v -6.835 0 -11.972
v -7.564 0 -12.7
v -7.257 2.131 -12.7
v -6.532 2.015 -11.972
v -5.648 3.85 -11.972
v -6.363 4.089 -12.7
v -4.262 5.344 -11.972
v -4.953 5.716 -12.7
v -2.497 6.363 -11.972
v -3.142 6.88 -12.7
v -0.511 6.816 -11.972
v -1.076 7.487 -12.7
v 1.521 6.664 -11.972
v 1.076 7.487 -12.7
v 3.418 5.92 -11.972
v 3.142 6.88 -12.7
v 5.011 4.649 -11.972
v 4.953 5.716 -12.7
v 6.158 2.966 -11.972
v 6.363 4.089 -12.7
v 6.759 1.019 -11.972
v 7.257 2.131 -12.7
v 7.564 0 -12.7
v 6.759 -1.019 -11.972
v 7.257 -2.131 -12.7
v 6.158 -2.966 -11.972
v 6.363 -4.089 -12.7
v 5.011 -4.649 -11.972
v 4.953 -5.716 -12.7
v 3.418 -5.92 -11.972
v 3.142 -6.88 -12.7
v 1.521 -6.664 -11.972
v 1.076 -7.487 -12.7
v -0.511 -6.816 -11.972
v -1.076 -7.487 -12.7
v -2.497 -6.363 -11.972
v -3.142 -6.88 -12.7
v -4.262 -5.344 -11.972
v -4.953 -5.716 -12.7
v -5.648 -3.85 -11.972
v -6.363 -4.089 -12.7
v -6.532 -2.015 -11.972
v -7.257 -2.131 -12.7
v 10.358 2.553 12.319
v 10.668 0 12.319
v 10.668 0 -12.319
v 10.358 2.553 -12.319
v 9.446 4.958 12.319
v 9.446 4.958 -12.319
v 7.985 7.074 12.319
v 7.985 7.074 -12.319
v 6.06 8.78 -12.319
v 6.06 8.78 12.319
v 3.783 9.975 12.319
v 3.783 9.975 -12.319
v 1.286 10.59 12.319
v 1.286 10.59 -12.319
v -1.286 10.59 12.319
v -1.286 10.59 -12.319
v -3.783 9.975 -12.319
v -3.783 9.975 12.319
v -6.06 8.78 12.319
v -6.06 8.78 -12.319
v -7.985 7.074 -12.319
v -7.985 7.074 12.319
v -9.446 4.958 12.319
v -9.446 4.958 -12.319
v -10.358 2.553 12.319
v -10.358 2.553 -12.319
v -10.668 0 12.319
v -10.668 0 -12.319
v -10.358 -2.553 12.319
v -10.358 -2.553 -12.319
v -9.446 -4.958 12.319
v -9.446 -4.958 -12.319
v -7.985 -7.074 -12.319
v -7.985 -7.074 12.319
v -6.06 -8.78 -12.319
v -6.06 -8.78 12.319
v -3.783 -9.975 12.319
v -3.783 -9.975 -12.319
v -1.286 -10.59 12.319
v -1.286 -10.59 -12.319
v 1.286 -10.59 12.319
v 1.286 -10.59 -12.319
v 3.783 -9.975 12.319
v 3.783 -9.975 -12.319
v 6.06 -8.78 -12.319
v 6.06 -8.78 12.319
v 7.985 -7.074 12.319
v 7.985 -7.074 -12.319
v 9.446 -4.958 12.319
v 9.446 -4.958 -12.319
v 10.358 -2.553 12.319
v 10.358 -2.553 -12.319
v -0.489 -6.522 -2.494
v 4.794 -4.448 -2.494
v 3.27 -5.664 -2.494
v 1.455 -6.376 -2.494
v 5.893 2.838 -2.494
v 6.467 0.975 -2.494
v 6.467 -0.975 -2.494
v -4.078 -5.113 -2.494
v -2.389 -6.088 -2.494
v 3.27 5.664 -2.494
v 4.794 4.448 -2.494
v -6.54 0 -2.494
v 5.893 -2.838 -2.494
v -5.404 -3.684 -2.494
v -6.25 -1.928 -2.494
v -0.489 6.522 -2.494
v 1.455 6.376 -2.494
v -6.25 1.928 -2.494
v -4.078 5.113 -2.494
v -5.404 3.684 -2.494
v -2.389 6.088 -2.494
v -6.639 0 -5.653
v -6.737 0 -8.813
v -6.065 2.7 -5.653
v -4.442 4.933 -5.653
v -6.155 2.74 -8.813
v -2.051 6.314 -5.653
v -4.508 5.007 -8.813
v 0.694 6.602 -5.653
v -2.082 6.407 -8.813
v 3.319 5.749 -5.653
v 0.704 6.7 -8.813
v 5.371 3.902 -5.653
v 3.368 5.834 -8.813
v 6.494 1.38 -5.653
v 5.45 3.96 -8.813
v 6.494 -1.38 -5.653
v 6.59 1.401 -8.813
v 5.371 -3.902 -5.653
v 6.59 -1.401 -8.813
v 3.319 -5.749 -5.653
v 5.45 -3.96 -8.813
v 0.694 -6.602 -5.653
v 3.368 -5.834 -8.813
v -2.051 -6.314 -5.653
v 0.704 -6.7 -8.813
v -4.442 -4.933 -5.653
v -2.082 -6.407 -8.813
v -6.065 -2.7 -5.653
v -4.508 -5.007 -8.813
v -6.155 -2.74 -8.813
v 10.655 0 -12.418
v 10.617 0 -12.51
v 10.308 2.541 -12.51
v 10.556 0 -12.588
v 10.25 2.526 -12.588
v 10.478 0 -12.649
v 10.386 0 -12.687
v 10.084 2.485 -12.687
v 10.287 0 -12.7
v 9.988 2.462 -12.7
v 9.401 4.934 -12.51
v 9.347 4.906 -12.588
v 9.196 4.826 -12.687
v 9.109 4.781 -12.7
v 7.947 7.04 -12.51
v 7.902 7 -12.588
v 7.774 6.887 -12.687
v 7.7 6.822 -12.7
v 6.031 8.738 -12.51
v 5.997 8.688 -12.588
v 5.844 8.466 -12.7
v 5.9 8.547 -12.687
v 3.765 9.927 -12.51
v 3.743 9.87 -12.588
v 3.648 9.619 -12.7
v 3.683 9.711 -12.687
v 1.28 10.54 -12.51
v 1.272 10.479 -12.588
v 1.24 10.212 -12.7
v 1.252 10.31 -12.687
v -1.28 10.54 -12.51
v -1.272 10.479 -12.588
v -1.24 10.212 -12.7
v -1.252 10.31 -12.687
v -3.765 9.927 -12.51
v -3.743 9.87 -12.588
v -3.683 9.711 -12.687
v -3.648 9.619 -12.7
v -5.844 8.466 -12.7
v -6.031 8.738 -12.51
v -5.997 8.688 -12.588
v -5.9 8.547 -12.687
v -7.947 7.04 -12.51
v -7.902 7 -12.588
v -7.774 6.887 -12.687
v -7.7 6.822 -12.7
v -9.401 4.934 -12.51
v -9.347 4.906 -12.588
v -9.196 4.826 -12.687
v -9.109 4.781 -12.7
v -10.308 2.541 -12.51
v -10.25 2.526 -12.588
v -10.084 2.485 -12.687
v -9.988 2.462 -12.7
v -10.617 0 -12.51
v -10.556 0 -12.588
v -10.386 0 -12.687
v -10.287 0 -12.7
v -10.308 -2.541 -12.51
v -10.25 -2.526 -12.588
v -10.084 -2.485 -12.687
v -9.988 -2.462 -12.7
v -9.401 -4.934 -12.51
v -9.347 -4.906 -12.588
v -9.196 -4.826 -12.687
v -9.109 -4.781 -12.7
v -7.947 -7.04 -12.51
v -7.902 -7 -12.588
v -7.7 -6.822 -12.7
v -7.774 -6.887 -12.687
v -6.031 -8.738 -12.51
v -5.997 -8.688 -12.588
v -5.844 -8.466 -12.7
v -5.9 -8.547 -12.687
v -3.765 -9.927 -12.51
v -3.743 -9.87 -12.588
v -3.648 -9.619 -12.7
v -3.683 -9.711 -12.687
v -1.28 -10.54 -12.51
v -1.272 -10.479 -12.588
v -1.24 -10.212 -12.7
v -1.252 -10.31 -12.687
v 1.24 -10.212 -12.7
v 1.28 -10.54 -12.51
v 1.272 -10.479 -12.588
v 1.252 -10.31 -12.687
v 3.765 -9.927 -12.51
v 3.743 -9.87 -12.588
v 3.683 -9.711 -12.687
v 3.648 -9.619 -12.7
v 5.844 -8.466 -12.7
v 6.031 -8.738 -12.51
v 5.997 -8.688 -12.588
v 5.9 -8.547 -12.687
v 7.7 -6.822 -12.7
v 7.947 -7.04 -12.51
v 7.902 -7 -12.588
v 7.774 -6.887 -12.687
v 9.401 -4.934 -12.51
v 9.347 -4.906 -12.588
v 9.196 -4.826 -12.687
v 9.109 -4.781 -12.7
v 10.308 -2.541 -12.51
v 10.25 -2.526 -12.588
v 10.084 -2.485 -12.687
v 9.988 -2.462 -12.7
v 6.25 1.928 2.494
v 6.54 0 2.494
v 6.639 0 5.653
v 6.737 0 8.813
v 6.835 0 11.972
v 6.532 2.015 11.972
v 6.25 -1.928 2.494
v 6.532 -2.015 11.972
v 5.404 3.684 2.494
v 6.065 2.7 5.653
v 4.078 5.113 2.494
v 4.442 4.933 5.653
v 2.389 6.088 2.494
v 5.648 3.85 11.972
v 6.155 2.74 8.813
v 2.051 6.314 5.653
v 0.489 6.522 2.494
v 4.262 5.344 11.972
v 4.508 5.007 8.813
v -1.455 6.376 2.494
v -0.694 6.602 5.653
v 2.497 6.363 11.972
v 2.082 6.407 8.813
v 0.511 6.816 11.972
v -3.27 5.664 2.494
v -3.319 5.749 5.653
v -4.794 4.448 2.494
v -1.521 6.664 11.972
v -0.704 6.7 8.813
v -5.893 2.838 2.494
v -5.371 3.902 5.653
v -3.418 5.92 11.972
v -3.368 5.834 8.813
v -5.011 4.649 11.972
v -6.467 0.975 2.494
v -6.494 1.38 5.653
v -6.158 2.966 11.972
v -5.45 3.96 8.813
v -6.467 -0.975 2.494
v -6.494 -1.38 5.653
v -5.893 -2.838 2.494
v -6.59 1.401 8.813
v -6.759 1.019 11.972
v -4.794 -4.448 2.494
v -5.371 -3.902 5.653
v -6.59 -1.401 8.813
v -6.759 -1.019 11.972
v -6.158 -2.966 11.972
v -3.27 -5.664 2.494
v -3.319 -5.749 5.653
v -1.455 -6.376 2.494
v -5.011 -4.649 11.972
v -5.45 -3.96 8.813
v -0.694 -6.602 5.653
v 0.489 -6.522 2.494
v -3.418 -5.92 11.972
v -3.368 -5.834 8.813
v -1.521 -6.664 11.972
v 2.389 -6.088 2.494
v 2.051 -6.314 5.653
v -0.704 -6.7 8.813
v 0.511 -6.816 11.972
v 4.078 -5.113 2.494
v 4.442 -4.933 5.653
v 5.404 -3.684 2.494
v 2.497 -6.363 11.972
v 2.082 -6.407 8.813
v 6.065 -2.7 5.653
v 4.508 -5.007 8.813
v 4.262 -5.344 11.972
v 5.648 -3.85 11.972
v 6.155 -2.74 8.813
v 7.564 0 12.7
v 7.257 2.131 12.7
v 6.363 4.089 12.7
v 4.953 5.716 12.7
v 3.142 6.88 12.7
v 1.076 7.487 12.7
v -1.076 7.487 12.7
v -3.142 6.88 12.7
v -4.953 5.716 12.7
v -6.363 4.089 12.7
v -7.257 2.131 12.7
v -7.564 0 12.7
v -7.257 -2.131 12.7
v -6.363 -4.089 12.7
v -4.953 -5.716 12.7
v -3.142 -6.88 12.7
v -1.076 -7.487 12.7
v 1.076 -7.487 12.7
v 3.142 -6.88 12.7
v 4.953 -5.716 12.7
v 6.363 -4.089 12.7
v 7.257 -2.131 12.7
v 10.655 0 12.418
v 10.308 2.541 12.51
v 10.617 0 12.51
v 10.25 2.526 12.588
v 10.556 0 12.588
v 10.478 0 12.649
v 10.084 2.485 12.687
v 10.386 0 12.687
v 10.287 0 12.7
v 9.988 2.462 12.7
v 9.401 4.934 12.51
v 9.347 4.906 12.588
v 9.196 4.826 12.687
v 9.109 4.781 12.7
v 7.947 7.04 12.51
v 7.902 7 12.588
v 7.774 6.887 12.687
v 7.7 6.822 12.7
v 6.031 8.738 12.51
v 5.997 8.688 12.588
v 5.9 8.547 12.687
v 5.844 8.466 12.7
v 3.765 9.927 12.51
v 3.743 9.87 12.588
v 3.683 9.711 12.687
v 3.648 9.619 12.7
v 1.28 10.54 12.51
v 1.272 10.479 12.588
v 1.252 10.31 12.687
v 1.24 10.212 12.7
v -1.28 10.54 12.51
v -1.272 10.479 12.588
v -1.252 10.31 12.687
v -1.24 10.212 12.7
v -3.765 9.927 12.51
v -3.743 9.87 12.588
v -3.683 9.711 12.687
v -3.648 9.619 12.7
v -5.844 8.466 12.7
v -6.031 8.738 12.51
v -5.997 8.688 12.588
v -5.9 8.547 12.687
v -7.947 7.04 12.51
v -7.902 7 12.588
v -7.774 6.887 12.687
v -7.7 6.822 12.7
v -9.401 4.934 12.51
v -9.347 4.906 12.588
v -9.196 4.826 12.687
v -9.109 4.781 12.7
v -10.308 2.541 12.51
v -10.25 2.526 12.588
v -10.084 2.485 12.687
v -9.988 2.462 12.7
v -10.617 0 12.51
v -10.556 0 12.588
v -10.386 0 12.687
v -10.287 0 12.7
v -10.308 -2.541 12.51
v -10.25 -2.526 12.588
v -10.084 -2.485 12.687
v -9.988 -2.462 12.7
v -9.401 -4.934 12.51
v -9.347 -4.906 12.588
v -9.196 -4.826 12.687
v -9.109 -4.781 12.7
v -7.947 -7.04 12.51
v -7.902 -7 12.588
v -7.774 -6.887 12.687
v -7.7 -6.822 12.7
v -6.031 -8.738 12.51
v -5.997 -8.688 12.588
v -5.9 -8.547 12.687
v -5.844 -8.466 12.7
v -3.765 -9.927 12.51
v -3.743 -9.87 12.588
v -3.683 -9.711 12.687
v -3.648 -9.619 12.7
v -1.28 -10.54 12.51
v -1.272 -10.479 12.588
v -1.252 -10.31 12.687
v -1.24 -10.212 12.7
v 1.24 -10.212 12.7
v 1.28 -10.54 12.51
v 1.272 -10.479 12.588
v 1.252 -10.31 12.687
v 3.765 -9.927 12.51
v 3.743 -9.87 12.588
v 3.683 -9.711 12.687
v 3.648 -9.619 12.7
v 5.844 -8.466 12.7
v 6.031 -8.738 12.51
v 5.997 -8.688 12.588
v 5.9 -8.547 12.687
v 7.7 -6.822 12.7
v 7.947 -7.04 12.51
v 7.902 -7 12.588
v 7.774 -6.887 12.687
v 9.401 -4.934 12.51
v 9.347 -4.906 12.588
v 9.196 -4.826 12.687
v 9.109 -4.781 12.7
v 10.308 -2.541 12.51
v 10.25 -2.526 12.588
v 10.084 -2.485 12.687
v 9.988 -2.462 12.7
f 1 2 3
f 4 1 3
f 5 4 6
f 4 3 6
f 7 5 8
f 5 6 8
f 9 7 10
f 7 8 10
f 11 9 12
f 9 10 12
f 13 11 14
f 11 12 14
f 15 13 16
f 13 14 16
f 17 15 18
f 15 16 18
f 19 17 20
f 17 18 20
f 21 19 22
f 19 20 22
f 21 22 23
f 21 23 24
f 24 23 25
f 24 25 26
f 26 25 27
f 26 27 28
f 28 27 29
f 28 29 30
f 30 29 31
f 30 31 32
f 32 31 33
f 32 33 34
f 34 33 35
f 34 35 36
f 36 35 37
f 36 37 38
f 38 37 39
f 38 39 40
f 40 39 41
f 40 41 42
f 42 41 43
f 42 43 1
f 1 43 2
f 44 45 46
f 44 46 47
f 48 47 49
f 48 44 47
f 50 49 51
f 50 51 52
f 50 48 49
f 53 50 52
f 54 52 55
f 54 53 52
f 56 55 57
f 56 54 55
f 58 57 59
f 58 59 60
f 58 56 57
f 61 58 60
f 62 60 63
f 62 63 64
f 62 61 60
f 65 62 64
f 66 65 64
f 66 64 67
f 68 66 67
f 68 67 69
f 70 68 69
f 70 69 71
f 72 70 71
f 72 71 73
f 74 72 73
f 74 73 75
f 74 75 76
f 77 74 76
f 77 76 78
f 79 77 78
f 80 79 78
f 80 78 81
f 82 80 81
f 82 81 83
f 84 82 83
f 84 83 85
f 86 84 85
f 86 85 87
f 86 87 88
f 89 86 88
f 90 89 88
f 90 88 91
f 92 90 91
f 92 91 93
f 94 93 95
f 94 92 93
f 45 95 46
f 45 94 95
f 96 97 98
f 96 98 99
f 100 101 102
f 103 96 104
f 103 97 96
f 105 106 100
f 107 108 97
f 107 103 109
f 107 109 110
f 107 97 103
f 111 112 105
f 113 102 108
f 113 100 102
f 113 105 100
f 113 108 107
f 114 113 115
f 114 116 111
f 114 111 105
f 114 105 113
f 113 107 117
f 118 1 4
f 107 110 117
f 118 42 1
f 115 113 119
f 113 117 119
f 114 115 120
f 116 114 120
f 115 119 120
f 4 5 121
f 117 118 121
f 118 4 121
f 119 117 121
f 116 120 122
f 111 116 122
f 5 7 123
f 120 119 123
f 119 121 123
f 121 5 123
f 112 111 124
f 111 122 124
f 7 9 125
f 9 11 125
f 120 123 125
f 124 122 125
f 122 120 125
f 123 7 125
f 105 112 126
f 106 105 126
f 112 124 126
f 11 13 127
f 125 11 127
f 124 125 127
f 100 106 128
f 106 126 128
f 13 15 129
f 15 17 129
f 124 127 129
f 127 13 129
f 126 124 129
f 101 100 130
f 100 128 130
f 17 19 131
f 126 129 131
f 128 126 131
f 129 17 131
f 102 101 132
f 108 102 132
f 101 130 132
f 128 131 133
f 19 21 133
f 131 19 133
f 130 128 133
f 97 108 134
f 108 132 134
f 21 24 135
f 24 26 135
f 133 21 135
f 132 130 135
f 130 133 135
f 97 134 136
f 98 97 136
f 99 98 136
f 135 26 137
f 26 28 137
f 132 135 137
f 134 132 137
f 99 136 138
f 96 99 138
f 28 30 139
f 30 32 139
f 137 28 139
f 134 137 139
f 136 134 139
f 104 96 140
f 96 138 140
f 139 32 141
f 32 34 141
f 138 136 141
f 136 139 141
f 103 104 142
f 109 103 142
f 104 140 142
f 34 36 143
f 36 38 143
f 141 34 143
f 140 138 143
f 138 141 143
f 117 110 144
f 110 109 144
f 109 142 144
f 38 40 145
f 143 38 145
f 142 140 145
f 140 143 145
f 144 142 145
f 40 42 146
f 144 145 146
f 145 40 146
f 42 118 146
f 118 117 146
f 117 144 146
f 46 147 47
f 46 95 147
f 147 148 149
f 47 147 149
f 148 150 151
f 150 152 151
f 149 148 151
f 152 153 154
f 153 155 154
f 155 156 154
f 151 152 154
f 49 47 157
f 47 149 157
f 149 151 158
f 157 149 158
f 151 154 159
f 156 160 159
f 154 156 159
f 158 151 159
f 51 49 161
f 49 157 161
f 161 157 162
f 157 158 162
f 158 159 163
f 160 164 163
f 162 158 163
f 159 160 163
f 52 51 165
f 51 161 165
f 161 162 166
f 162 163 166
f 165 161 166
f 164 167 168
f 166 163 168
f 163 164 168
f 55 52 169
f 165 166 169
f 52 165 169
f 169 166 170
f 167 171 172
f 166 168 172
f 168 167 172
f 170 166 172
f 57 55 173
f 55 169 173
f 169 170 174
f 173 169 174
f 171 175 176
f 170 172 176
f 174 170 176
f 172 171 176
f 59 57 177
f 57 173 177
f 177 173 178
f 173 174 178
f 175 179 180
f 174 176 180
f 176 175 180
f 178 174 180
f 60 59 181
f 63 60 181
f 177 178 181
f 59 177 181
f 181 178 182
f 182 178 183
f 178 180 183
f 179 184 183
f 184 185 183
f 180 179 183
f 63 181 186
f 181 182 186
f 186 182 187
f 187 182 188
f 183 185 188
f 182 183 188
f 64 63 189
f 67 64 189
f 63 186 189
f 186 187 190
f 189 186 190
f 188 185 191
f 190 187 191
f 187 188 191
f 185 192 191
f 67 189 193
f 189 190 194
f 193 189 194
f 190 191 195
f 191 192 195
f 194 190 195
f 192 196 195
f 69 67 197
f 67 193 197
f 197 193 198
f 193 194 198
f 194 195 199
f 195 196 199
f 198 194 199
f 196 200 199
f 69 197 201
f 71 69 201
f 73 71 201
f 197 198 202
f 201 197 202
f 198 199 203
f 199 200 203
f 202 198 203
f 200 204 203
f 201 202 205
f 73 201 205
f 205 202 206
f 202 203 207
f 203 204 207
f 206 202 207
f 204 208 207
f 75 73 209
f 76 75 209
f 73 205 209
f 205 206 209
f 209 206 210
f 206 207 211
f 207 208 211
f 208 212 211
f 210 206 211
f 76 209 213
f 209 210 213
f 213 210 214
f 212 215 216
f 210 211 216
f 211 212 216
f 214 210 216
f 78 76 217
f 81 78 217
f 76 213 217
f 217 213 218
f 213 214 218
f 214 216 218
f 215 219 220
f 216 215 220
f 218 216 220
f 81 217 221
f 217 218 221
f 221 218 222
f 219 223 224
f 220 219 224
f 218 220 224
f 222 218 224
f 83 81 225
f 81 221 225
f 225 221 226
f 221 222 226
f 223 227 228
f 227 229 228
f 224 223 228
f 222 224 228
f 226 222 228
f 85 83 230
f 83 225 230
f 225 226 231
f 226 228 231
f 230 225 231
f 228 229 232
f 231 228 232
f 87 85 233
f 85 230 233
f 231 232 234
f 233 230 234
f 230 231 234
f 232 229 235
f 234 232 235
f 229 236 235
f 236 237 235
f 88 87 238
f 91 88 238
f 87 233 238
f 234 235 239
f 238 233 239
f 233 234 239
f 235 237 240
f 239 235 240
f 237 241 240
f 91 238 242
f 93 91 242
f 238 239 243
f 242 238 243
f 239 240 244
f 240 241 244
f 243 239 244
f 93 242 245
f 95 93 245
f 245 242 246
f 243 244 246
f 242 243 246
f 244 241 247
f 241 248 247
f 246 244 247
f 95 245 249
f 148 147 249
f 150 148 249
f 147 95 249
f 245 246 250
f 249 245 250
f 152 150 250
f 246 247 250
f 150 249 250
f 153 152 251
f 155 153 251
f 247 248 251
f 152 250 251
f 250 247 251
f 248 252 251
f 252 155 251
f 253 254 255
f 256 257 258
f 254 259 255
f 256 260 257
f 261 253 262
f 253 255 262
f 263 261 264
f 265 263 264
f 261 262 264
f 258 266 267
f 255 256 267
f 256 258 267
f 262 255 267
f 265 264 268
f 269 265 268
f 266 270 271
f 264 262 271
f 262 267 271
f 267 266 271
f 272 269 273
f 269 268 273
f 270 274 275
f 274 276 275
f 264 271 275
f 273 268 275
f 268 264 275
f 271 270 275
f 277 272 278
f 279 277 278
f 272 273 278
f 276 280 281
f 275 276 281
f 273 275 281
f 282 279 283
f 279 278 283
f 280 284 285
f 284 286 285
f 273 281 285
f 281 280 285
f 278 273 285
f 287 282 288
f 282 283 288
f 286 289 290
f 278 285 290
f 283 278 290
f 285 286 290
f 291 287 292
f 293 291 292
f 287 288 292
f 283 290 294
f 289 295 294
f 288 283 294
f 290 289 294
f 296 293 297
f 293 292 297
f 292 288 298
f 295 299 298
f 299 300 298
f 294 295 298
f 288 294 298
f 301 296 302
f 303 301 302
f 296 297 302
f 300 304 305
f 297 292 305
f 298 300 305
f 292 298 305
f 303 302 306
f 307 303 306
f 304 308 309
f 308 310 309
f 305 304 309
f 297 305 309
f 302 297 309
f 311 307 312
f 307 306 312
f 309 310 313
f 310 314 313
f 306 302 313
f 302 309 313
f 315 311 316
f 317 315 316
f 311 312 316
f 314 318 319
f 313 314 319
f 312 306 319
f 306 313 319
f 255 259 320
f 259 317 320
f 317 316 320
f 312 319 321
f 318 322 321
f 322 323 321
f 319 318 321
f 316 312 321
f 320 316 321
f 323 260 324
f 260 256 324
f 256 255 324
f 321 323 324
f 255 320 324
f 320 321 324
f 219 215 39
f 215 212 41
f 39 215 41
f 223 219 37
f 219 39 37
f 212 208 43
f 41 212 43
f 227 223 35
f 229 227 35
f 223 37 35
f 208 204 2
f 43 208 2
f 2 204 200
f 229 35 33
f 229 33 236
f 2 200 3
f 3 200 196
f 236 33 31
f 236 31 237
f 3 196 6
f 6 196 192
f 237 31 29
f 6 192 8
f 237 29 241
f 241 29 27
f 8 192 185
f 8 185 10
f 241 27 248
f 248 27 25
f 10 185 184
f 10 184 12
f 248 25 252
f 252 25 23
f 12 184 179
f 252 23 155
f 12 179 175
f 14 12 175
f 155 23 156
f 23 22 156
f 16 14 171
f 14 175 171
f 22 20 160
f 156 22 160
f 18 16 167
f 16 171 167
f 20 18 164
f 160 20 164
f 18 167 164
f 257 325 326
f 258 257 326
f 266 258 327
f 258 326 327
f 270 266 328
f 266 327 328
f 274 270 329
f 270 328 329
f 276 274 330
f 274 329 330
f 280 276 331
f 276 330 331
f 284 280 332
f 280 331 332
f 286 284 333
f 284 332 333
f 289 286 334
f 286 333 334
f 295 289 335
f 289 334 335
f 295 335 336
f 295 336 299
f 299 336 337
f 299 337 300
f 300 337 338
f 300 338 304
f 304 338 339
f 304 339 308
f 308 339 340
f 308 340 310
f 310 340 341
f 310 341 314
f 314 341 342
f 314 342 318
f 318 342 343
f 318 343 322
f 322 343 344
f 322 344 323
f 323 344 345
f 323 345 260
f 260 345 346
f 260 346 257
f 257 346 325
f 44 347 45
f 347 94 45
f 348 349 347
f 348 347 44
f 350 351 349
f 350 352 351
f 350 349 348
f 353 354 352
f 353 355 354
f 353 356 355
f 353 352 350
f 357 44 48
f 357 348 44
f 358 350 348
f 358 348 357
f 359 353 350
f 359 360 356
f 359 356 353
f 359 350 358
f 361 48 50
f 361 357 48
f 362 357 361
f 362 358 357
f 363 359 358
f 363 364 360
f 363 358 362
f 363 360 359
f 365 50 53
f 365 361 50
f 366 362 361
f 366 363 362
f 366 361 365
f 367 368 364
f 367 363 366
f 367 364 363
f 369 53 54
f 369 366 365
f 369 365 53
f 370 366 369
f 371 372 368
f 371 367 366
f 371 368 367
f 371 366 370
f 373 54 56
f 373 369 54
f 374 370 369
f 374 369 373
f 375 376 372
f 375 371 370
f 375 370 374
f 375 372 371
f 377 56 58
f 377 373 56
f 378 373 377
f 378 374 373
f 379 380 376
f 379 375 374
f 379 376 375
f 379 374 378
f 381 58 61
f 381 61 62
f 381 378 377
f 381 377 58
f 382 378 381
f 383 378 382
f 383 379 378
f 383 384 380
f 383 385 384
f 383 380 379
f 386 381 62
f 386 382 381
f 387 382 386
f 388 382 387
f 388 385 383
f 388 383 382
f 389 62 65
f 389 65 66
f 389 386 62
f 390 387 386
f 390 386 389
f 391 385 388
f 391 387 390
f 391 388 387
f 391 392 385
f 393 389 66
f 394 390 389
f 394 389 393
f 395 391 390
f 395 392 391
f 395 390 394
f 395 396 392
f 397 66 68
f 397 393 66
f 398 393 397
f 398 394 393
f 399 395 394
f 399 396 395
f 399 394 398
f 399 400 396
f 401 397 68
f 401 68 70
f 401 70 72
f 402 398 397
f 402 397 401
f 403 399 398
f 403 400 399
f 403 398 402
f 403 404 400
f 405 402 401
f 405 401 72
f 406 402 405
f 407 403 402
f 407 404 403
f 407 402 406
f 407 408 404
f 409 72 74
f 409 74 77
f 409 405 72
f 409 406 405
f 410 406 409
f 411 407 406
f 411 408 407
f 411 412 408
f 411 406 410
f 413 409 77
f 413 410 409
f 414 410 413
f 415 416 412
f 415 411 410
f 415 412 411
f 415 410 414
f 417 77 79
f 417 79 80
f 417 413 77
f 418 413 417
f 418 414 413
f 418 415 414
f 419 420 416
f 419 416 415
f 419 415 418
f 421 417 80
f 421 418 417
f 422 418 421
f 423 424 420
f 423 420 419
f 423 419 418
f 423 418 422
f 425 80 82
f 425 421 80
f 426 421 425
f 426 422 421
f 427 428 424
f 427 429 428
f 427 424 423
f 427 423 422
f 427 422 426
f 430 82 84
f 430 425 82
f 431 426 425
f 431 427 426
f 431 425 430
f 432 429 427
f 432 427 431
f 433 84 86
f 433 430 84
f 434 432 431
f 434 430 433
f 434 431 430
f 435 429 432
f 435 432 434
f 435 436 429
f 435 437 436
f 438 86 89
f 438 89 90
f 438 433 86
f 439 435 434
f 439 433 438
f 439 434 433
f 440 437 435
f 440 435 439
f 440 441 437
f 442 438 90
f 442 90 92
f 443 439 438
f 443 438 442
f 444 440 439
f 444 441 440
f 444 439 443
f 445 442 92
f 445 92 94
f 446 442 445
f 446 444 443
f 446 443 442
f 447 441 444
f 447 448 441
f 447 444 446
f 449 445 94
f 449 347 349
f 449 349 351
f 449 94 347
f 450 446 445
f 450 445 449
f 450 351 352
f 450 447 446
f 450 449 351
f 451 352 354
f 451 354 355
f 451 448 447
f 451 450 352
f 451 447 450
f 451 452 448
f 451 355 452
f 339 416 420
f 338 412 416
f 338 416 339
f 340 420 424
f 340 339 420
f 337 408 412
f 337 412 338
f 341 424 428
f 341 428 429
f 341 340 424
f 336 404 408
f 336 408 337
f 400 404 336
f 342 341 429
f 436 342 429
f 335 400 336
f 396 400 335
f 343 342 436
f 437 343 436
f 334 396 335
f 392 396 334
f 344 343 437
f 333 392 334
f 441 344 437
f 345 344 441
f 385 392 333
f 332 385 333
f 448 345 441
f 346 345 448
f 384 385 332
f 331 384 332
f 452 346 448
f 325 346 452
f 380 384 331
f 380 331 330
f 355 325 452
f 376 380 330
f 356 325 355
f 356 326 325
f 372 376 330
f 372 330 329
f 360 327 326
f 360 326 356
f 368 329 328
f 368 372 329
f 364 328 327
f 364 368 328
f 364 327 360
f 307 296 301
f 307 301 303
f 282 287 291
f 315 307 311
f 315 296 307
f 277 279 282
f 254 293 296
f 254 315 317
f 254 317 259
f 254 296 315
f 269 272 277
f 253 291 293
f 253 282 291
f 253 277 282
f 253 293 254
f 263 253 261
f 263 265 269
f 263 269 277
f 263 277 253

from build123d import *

# Parameters (mm, degrees)
SKETCH1_R                   = 10.668
EXTRUDE1_DEPTH              = 12.7
SKETCH2_R                   = 6.858
CUT_EXTRUDE1_DEPTH          = 10.20572
CUT_EXTRUDE1_DRAFT          = -1.783333333
SKETCH5_R                   = 7.563555556
CUT_EXTRUDE3_DEPTH          = 3.175
CUT_EXTRUDE3_DRAFT          = -45
CIRPATTERN1_COPY_1_SKETCH_R = 6.858
CIRPATTERN1_COPY_1_DEPTH    = 10.20572
CIRPATTERN1_COPY_1_DRAFT    = -1.783333333
CIRPATTERN1_COPY_2_SKETCH_R = 7.563555556
CIRPATTERN1_COPY_2_DEPTH    = 3.175
CIRPATTERN1_COPY_2_DRAFT    = -45
FILLET1_R                   = 0.381


with BuildPart() as part:
    # Sketch1 → Extrude1 (new, symmetric)
    with BuildSketch(Plane.XY):
        Circle(SKETCH1_R)
    extrude(amount=EXTRUDE1_DEPTH, both=True)


with BuildPart() as cut_extrude1_tool:
    # Sketch2 → Cut-Extrude1 (with draft: the straight prism first)
    with BuildSketch(Plane.XY.offset(12.7)):
        Circle(SKETCH2_R)
    extrude(amount=-CUT_EXTRUDE1_DEPTH)
    # Cut-Extrude1: the draft: its side faces are tilted about the plane it starts from
    cut_extrude1_sides = [cut_extrude1_tool.faces().sort_by_distance(p)[0] for p in [
        (-6.858, 0, 7.59714),
    ]]
    draft(cut_extrude1_sides, Plane.XY.offset(12.7), CUT_EXTRUDE1_DRAFT)


with BuildPart() as part_1:
    add(part.part)

    # Cut-Extrude1: cut by cut_extrude1_tool
    add(cut_extrude1_tool.part, mode=Mode.SUBTRACT)


with BuildPart() as cut_extrude3_tool:
    # Sketch5 → Cut-Extrude3 (with draft: the straight prism first)
    with BuildSketch(Plane.XY.offset(12.7)):
        Circle(SKETCH5_R)
    extrude(amount=-CUT_EXTRUDE3_DEPTH)
    # Cut-Extrude3: the draft: its side faces are tilted about the plane it starts from
    cut_extrude3_sides = [cut_extrude3_tool.faces().sort_by_distance(p)[0] for p in [
        (-7.563555556, 0, 11.1125),
    ]]
    draft(cut_extrude3_sides, Plane.XY.offset(12.7), CUT_EXTRUDE3_DRAFT)


with BuildPart() as part_2:
    add(part_1.part)

    # Cut-Extrude3: cut by cut_extrude3_tool
    add(cut_extrude3_tool.part, mode=Mode.SUBTRACT)


with BuildPart() as cirpattern1_copy_1_tool:
    # CirPattern1 copy 1 sketch → CirPattern1 copy 1 (with draft: the straight prism first)
    with BuildSketch(Plane(origin=(0, 0, -12.7), x_dir=(-1, 0, 0), z_dir=(0, 0, -1))):
        Circle(CIRPATTERN1_COPY_1_SKETCH_R)
    extrude(amount=-CIRPATTERN1_COPY_1_DEPTH)
    # CirPattern1 copy 1: the draft: its side faces are tilted about the plane it starts from
    cirpattern1_copy_1_sides = [cirpattern1_copy_1_tool.faces().sort_by_distance(p)[0] for p in [
        (6.858, 0, -7.59714),
    ]]
    draft(cirpattern1_copy_1_sides, Plane(origin=(0, 0, -12.7), x_dir=(-1, 0, 0), z_dir=(0, 0, -1)), CIRPATTERN1_COPY_1_DRAFT)


with BuildPart() as part_3:
    add(part_2.part)

    # CirPattern1 copy 1: cut by cirpattern1_copy_1_tool
    add(cirpattern1_copy_1_tool.part, mode=Mode.SUBTRACT)


with BuildPart() as cirpattern1_copy_2_tool:
    # CirPattern1 copy 2 sketch → CirPattern1 copy 2 (with draft: the straight prism first)
    with BuildSketch(Plane(origin=(0, 0, -12.7), x_dir=(-1, 0, 0), z_dir=(0, 0, -1))):
        Circle(CIRPATTERN1_COPY_2_SKETCH_R)
    extrude(amount=-CIRPATTERN1_COPY_2_DEPTH)
    # CirPattern1 copy 2: the draft: its side faces are tilted about the plane it starts from
    cirpattern1_copy_2_sides = [cirpattern1_copy_2_tool.faces().sort_by_distance(p)[0] for p in [
        (7.563555556, 0, -11.1125),
    ]]
    draft(cirpattern1_copy_2_sides, Plane(origin=(0, 0, -12.7), x_dir=(-1, 0, 0), z_dir=(0, 0, -1)), CIRPATTERN1_COPY_2_DRAFT)


with BuildPart() as part_4:
    add(part_3.part)

    # CirPattern1 copy 2: cut by cirpattern1_copy_2_tool
    add(cirpattern1_copy_2_tool.part, mode=Mode.SUBTRACT)

    # Fillet1
    fillet1_edges = [part_4.edges().sort_by_distance(p)[0] for p in [
        (-10.668, 0, -12.7),
        (-10.668, 0, 12.7),
    ]]
    fillet(fillet1_edges, radius=FILLET1_R)


solid = part_4.part
